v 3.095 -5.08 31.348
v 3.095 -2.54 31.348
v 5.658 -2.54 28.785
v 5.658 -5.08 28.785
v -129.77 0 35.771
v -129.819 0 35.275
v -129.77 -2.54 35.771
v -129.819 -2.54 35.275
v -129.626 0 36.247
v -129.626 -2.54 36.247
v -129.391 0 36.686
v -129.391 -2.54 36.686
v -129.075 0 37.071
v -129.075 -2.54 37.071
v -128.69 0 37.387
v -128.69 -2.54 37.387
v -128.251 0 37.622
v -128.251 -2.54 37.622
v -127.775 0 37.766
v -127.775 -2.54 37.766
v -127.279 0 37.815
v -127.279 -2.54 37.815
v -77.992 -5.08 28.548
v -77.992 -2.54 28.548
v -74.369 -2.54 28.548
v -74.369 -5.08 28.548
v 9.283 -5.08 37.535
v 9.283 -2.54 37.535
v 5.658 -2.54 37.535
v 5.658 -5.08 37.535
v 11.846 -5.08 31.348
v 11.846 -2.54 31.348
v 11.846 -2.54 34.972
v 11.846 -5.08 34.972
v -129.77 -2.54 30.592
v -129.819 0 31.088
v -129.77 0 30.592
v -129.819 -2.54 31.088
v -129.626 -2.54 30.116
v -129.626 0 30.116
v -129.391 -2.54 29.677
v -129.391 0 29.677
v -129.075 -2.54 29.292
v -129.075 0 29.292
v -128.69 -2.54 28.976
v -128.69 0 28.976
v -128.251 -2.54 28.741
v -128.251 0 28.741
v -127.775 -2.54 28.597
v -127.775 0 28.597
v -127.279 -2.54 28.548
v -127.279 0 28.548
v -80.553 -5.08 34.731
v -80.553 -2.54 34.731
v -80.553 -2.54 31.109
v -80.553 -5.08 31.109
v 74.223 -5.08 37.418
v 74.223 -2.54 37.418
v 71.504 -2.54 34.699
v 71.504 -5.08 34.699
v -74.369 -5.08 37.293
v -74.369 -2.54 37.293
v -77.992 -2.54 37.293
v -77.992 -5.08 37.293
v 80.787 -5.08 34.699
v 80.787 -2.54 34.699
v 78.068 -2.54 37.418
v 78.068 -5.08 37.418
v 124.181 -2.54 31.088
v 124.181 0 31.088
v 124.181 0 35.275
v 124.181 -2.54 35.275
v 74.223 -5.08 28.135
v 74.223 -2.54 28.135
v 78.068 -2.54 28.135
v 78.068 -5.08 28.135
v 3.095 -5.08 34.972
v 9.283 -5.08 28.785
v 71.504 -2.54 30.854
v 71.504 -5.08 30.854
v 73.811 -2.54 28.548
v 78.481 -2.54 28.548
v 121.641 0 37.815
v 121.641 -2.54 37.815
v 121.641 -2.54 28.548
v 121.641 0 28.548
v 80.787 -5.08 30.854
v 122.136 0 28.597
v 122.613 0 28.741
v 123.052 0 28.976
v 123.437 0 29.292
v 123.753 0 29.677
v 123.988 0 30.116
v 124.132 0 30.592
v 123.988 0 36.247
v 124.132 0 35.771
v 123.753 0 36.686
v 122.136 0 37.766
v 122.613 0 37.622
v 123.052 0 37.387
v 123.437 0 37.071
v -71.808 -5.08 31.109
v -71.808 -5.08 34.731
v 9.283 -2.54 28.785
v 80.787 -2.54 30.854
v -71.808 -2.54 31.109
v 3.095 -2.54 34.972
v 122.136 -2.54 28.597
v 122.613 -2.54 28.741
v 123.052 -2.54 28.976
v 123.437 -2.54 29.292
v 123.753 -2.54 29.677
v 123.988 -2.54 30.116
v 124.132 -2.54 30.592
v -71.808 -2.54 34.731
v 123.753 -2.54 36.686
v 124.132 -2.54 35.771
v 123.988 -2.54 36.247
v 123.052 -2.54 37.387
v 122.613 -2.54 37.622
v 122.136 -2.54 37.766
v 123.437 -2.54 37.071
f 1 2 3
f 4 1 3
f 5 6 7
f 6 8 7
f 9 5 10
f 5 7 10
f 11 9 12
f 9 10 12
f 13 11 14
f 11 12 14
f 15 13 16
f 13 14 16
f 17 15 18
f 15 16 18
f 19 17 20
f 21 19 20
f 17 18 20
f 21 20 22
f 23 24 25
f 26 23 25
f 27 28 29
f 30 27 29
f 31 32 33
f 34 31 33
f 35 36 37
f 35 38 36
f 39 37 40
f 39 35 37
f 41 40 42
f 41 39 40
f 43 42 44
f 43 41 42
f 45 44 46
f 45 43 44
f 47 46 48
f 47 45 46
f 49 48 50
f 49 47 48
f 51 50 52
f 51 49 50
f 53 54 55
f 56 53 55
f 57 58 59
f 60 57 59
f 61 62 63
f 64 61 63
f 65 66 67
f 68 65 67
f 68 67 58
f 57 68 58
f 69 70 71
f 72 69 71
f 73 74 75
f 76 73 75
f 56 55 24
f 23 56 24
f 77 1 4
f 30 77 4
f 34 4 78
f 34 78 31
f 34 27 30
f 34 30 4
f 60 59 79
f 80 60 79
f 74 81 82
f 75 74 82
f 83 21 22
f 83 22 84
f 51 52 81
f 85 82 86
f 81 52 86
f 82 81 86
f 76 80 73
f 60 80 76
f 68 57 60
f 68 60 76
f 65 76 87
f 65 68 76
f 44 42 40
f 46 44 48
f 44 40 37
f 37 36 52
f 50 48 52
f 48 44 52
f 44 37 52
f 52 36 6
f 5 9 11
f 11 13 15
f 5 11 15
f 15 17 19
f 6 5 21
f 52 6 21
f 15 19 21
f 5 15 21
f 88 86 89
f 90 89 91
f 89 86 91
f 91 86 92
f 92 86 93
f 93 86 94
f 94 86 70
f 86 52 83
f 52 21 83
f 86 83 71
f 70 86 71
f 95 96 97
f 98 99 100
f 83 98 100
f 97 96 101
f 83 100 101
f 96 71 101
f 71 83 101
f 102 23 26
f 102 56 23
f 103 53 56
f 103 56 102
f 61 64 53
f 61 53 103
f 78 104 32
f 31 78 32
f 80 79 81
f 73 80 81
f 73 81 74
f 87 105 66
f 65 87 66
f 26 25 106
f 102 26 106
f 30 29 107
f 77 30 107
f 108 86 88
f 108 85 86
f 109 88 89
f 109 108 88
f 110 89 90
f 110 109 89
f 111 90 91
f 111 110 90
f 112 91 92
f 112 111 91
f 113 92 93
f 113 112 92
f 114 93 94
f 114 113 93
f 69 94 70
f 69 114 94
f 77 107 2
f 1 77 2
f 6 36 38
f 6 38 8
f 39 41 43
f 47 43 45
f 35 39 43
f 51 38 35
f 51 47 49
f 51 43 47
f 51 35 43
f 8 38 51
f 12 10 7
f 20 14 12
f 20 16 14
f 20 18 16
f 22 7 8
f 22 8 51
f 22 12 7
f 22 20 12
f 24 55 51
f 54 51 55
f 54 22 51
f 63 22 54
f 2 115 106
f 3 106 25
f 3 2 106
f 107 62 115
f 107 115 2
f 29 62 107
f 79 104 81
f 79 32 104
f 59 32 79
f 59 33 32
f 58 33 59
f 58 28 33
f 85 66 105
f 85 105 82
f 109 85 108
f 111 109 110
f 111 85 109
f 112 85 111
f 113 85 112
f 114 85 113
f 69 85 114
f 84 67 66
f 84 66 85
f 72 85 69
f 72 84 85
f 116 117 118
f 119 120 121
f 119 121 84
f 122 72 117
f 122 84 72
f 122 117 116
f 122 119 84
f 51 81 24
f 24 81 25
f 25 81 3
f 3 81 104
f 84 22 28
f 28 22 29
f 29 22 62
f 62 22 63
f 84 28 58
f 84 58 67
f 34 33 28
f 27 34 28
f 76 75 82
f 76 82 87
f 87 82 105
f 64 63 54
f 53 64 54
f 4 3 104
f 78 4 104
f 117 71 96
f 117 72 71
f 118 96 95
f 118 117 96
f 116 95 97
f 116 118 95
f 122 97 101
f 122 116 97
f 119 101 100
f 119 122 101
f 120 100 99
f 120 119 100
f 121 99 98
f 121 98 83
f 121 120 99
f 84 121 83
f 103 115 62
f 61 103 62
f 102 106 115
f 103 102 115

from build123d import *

# Parameters (mm, degrees)
F0_W     = 254
F0_H     = 9.267491
F1_DEPTH = 2.54
F2_R     = 2.54
F6_DEPTH = 2.54


with BuildPart() as f1:
    # F0 (on Front) → F1 (new body)
    with BuildSketch(Plane.XZ):
        with Locations((-2.819128, 33.181484)):
            Rectangle(F0_W, F0_H)
    extrude(amount=F1_DEPTH)

    # F2
    f2_edges = [f1.edges().sort_by_distance(p)[0] for p in [
        (124.180872, -1.27, 37.81523),
        (124.180872, -1.27, 28.547739),
        (-129.819128, -1.27, 37.81523),
        (-129.819128, -1.27, 28.547739),
    ]]
    fillet(f2_edges, radius=F2_R)

    # F3 (on face) + F4 (on face) + F5 (on face) → F6 (join)
    with BuildSketch(Plane.XZ.offset(2.54)):
        Polygon((-77.991536, 28.547739), (-74.369276, 28.547739), (-71.807952, 31.109063), (-71.807952, 34.731323), (-74.369276, 37.292647), (-77.991536, 37.292647), (-80.55286, 34.731323), (-80.55286, 31.109063), align=None)
    with BuildSketch(Plane.XZ.offset(2.54)):
        Polygon((5.658443, 28.784776), (9.283109, 28.784776), (11.846135, 31.347802), (11.846135, 34.972468), (9.283109, 37.535494), (5.658443, 37.535494), (3.095417, 34.972468), (3.095417, 31.347802), align=None)
    with BuildSketch(Plane.XZ.offset(2.54)):
        Polygon((74.223366, 28.135227), (78.068468, 28.135227), (78.48098, 28.547739), (73.810854, 28.547739), align=None)
        Polygon((73.810854, 28.547739), (78.48098, 28.547739), (80.787366, 30.854125), (80.787366, 34.699227), (78.068468, 37.418125), (74.223366, 37.418125), (71.504468, 34.699227), (71.504468, 30.854125), align=None)
    extrude(amount=F6_DEPTH)


solid = f1.part
